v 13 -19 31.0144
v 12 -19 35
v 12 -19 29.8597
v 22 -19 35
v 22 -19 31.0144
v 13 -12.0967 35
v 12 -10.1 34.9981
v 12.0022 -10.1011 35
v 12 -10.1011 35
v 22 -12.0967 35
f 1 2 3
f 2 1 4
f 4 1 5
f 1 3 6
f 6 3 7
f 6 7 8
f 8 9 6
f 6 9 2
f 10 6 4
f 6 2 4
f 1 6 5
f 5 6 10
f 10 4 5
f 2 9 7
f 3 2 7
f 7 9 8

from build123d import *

# Parameters (mm, degrees)
EXTRUDE028_DEPTH        = 15
BODY011_PLACEMENT_ANGLE = 30
BOX002_W                = 10
BOX002_H                = 10
BOX002_DEPTH            = 10


with BuildPart() as body011:
    # Sketch031 (on Cut) → Extrude028 (new body)
    with BuildSketch(Plane.XZ):
        Polygon((0, 3), (1, 4), (10, 4), (10, 9), (0, 9), align=None)
    extrude(amount=EXTRUDE028_DEPTH)


with BuildPart() as body011_1:
    # Body011 placement: moved
    add(body011.part.moved(Location((12, -8.6, 32.4))).rotate(Axis((12, -8.6, 32.4), (1, 0, 0)), BODY011_PLACEMENT_ANGLE))


with BuildPart() as cable:
    # Box002 → Box002 (new body)
    with BuildSketch(Plane(origin=(12, -19, 35), x_dir=(1, 0, 0), z_dir=(0, 1, 0))):
        with Locations((5, 5)):
            Rectangle(BOX002_W, BOX002_H)
    extrude(amount=BOX002_DEPTH)

    # Common: intersect Body011
    add(body011_1.part, mode=Mode.INTERSECT)


solid = cable.part
